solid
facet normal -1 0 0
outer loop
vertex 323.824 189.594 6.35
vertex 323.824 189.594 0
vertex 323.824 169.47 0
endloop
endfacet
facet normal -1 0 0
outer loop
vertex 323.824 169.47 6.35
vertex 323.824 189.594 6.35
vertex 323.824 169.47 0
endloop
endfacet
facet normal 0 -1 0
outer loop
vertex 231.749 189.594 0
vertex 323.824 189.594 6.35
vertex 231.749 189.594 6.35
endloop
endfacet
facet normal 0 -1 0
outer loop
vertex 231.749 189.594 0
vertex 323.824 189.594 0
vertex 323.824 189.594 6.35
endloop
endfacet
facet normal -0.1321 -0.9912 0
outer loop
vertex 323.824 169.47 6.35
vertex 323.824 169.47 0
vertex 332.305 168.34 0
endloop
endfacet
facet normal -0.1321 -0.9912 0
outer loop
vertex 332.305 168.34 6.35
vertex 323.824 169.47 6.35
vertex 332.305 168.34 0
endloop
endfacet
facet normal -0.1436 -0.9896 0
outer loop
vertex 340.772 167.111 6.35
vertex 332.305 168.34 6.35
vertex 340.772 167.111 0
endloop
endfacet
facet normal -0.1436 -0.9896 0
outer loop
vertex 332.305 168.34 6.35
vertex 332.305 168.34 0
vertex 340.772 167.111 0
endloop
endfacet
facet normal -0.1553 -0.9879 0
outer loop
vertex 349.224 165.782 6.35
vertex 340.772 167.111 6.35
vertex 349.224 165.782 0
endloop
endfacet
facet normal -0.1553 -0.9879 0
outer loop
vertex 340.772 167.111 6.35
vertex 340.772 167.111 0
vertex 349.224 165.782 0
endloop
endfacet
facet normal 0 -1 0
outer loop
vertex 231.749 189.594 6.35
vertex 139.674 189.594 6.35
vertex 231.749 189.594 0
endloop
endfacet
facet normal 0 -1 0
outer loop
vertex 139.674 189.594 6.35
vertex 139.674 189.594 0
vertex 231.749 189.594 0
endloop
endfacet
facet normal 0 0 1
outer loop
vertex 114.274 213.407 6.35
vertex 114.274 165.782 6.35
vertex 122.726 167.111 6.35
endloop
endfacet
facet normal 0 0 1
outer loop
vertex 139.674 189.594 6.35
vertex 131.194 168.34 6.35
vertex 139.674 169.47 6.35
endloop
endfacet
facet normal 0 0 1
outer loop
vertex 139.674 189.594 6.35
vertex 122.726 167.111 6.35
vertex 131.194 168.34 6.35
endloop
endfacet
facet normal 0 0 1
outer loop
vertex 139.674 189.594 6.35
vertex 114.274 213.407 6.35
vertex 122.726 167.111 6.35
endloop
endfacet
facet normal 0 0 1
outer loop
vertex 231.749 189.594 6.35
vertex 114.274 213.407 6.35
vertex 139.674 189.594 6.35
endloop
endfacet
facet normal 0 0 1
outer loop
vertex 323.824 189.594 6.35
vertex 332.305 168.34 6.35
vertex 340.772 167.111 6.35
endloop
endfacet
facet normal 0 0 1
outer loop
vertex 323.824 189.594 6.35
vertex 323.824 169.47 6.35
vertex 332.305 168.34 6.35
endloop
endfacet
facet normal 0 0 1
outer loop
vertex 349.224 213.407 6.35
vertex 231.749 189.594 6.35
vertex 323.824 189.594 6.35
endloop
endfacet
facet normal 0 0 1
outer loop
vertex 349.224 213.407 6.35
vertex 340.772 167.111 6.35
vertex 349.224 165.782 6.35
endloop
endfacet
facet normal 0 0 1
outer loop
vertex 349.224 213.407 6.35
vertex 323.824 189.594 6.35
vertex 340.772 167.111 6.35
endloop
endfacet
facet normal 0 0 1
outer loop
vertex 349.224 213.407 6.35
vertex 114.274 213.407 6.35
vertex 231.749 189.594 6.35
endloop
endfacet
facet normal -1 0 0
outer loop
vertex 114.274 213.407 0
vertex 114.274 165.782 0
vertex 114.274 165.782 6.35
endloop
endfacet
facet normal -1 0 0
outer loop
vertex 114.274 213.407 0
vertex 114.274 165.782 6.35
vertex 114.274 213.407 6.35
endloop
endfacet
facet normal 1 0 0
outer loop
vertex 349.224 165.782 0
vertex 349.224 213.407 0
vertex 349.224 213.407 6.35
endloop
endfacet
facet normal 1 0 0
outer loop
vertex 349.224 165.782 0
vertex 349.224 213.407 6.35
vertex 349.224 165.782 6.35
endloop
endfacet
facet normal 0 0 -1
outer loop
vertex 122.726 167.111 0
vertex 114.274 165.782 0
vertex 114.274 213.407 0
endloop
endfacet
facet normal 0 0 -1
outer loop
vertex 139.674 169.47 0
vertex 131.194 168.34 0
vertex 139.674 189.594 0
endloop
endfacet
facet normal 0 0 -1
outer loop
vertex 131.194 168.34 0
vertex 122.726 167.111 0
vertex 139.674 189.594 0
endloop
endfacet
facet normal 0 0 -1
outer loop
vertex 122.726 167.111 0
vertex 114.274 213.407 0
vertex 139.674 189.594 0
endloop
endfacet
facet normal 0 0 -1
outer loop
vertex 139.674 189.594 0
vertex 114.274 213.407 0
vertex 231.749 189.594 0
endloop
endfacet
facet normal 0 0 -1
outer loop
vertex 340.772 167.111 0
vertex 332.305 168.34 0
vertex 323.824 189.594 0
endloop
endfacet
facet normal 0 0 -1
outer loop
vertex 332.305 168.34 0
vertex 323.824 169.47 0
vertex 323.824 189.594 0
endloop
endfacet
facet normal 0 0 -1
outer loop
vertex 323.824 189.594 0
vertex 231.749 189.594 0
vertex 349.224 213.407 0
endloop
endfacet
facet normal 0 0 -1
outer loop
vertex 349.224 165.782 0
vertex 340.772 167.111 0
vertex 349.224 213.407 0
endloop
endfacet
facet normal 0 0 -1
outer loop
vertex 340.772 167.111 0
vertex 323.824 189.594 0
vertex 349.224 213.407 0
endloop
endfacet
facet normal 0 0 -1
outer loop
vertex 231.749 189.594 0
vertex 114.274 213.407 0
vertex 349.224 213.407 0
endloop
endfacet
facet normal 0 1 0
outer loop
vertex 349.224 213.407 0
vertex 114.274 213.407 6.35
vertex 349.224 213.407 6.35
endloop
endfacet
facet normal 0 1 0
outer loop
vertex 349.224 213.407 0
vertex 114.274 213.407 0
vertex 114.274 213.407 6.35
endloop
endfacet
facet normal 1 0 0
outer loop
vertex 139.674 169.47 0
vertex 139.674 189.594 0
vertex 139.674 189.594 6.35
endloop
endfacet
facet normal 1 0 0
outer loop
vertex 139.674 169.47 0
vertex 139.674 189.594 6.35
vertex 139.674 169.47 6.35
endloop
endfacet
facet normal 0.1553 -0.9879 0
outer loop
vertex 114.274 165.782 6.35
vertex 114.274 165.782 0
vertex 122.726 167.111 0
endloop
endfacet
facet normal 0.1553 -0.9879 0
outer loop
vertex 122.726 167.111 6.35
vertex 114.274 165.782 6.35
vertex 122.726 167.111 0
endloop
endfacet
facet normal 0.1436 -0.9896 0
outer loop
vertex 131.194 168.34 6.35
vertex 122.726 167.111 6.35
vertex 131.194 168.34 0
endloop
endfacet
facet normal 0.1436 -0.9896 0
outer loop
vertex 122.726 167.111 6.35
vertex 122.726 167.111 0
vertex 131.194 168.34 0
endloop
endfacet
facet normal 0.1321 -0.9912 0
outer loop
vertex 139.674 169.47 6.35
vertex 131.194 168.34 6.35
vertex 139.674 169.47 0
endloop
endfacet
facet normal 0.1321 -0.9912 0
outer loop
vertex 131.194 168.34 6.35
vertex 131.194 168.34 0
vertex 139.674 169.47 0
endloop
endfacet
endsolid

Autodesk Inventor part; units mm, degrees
ref_plane "YZ Plane" through (0, 0, 0) normal (1, 0, 0) x (0, 1, 0)
ref_plane "XZ Plane" through (0, 0, 0) normal (0, 1, 0) x (-1, 0, 0)
ref_plane "XY Plane" through (0, 0, 0) normal (0, 0, 1) x (1, 0, 0)
sketch "Sketch1" plane through (0, 0, 0) normal (0, 0, 1) x (1, 0, 0)
  line L0 (114.2744, 165.7819) -> (114.2744, 213.4069)
  line L1 (114.2744, 213.4069) -> (349.2244, 213.4069)
  line L2 (114.2744, 213.4069) -> (349.2244, 213.4069) construction
  line L3 (349.2244, 213.4069) -> (349.2244, 165.7819)
  line L4 (139.6744, 189.5944) -> (139.6744, 169.4704)
  line L5 (139.6744, 189.5944) -> (231.7494, 189.5944)
  line L6 (139.6744, 189.5944) -> (231.7494, 189.5944) construction
  line L7 (323.8244, 189.5944) -> (323.8244, 169.4704)
  line L8 (323.8244, 189.5944) -> (231.7494, 189.5944)
  line L9 (323.8244, 189.5944) -> (231.7494, 189.5944) construction
  line L10 (231.7494, 189.5944) -> (231.7494, 175.3069)
  arc A0 (349.2244, 165.7819) -> (323.8244, 169.4704) centre (231.7494, -553.8848) ccw
  arc A1 (139.6744, 169.4704) -> (114.2744, 165.7819) centre (231.7494, -553.8848) ccw
extrude "Extrusion1" add sketch "Sketch1" along normal blind 6.35
properties part number "Skateboard Electronics Box"
